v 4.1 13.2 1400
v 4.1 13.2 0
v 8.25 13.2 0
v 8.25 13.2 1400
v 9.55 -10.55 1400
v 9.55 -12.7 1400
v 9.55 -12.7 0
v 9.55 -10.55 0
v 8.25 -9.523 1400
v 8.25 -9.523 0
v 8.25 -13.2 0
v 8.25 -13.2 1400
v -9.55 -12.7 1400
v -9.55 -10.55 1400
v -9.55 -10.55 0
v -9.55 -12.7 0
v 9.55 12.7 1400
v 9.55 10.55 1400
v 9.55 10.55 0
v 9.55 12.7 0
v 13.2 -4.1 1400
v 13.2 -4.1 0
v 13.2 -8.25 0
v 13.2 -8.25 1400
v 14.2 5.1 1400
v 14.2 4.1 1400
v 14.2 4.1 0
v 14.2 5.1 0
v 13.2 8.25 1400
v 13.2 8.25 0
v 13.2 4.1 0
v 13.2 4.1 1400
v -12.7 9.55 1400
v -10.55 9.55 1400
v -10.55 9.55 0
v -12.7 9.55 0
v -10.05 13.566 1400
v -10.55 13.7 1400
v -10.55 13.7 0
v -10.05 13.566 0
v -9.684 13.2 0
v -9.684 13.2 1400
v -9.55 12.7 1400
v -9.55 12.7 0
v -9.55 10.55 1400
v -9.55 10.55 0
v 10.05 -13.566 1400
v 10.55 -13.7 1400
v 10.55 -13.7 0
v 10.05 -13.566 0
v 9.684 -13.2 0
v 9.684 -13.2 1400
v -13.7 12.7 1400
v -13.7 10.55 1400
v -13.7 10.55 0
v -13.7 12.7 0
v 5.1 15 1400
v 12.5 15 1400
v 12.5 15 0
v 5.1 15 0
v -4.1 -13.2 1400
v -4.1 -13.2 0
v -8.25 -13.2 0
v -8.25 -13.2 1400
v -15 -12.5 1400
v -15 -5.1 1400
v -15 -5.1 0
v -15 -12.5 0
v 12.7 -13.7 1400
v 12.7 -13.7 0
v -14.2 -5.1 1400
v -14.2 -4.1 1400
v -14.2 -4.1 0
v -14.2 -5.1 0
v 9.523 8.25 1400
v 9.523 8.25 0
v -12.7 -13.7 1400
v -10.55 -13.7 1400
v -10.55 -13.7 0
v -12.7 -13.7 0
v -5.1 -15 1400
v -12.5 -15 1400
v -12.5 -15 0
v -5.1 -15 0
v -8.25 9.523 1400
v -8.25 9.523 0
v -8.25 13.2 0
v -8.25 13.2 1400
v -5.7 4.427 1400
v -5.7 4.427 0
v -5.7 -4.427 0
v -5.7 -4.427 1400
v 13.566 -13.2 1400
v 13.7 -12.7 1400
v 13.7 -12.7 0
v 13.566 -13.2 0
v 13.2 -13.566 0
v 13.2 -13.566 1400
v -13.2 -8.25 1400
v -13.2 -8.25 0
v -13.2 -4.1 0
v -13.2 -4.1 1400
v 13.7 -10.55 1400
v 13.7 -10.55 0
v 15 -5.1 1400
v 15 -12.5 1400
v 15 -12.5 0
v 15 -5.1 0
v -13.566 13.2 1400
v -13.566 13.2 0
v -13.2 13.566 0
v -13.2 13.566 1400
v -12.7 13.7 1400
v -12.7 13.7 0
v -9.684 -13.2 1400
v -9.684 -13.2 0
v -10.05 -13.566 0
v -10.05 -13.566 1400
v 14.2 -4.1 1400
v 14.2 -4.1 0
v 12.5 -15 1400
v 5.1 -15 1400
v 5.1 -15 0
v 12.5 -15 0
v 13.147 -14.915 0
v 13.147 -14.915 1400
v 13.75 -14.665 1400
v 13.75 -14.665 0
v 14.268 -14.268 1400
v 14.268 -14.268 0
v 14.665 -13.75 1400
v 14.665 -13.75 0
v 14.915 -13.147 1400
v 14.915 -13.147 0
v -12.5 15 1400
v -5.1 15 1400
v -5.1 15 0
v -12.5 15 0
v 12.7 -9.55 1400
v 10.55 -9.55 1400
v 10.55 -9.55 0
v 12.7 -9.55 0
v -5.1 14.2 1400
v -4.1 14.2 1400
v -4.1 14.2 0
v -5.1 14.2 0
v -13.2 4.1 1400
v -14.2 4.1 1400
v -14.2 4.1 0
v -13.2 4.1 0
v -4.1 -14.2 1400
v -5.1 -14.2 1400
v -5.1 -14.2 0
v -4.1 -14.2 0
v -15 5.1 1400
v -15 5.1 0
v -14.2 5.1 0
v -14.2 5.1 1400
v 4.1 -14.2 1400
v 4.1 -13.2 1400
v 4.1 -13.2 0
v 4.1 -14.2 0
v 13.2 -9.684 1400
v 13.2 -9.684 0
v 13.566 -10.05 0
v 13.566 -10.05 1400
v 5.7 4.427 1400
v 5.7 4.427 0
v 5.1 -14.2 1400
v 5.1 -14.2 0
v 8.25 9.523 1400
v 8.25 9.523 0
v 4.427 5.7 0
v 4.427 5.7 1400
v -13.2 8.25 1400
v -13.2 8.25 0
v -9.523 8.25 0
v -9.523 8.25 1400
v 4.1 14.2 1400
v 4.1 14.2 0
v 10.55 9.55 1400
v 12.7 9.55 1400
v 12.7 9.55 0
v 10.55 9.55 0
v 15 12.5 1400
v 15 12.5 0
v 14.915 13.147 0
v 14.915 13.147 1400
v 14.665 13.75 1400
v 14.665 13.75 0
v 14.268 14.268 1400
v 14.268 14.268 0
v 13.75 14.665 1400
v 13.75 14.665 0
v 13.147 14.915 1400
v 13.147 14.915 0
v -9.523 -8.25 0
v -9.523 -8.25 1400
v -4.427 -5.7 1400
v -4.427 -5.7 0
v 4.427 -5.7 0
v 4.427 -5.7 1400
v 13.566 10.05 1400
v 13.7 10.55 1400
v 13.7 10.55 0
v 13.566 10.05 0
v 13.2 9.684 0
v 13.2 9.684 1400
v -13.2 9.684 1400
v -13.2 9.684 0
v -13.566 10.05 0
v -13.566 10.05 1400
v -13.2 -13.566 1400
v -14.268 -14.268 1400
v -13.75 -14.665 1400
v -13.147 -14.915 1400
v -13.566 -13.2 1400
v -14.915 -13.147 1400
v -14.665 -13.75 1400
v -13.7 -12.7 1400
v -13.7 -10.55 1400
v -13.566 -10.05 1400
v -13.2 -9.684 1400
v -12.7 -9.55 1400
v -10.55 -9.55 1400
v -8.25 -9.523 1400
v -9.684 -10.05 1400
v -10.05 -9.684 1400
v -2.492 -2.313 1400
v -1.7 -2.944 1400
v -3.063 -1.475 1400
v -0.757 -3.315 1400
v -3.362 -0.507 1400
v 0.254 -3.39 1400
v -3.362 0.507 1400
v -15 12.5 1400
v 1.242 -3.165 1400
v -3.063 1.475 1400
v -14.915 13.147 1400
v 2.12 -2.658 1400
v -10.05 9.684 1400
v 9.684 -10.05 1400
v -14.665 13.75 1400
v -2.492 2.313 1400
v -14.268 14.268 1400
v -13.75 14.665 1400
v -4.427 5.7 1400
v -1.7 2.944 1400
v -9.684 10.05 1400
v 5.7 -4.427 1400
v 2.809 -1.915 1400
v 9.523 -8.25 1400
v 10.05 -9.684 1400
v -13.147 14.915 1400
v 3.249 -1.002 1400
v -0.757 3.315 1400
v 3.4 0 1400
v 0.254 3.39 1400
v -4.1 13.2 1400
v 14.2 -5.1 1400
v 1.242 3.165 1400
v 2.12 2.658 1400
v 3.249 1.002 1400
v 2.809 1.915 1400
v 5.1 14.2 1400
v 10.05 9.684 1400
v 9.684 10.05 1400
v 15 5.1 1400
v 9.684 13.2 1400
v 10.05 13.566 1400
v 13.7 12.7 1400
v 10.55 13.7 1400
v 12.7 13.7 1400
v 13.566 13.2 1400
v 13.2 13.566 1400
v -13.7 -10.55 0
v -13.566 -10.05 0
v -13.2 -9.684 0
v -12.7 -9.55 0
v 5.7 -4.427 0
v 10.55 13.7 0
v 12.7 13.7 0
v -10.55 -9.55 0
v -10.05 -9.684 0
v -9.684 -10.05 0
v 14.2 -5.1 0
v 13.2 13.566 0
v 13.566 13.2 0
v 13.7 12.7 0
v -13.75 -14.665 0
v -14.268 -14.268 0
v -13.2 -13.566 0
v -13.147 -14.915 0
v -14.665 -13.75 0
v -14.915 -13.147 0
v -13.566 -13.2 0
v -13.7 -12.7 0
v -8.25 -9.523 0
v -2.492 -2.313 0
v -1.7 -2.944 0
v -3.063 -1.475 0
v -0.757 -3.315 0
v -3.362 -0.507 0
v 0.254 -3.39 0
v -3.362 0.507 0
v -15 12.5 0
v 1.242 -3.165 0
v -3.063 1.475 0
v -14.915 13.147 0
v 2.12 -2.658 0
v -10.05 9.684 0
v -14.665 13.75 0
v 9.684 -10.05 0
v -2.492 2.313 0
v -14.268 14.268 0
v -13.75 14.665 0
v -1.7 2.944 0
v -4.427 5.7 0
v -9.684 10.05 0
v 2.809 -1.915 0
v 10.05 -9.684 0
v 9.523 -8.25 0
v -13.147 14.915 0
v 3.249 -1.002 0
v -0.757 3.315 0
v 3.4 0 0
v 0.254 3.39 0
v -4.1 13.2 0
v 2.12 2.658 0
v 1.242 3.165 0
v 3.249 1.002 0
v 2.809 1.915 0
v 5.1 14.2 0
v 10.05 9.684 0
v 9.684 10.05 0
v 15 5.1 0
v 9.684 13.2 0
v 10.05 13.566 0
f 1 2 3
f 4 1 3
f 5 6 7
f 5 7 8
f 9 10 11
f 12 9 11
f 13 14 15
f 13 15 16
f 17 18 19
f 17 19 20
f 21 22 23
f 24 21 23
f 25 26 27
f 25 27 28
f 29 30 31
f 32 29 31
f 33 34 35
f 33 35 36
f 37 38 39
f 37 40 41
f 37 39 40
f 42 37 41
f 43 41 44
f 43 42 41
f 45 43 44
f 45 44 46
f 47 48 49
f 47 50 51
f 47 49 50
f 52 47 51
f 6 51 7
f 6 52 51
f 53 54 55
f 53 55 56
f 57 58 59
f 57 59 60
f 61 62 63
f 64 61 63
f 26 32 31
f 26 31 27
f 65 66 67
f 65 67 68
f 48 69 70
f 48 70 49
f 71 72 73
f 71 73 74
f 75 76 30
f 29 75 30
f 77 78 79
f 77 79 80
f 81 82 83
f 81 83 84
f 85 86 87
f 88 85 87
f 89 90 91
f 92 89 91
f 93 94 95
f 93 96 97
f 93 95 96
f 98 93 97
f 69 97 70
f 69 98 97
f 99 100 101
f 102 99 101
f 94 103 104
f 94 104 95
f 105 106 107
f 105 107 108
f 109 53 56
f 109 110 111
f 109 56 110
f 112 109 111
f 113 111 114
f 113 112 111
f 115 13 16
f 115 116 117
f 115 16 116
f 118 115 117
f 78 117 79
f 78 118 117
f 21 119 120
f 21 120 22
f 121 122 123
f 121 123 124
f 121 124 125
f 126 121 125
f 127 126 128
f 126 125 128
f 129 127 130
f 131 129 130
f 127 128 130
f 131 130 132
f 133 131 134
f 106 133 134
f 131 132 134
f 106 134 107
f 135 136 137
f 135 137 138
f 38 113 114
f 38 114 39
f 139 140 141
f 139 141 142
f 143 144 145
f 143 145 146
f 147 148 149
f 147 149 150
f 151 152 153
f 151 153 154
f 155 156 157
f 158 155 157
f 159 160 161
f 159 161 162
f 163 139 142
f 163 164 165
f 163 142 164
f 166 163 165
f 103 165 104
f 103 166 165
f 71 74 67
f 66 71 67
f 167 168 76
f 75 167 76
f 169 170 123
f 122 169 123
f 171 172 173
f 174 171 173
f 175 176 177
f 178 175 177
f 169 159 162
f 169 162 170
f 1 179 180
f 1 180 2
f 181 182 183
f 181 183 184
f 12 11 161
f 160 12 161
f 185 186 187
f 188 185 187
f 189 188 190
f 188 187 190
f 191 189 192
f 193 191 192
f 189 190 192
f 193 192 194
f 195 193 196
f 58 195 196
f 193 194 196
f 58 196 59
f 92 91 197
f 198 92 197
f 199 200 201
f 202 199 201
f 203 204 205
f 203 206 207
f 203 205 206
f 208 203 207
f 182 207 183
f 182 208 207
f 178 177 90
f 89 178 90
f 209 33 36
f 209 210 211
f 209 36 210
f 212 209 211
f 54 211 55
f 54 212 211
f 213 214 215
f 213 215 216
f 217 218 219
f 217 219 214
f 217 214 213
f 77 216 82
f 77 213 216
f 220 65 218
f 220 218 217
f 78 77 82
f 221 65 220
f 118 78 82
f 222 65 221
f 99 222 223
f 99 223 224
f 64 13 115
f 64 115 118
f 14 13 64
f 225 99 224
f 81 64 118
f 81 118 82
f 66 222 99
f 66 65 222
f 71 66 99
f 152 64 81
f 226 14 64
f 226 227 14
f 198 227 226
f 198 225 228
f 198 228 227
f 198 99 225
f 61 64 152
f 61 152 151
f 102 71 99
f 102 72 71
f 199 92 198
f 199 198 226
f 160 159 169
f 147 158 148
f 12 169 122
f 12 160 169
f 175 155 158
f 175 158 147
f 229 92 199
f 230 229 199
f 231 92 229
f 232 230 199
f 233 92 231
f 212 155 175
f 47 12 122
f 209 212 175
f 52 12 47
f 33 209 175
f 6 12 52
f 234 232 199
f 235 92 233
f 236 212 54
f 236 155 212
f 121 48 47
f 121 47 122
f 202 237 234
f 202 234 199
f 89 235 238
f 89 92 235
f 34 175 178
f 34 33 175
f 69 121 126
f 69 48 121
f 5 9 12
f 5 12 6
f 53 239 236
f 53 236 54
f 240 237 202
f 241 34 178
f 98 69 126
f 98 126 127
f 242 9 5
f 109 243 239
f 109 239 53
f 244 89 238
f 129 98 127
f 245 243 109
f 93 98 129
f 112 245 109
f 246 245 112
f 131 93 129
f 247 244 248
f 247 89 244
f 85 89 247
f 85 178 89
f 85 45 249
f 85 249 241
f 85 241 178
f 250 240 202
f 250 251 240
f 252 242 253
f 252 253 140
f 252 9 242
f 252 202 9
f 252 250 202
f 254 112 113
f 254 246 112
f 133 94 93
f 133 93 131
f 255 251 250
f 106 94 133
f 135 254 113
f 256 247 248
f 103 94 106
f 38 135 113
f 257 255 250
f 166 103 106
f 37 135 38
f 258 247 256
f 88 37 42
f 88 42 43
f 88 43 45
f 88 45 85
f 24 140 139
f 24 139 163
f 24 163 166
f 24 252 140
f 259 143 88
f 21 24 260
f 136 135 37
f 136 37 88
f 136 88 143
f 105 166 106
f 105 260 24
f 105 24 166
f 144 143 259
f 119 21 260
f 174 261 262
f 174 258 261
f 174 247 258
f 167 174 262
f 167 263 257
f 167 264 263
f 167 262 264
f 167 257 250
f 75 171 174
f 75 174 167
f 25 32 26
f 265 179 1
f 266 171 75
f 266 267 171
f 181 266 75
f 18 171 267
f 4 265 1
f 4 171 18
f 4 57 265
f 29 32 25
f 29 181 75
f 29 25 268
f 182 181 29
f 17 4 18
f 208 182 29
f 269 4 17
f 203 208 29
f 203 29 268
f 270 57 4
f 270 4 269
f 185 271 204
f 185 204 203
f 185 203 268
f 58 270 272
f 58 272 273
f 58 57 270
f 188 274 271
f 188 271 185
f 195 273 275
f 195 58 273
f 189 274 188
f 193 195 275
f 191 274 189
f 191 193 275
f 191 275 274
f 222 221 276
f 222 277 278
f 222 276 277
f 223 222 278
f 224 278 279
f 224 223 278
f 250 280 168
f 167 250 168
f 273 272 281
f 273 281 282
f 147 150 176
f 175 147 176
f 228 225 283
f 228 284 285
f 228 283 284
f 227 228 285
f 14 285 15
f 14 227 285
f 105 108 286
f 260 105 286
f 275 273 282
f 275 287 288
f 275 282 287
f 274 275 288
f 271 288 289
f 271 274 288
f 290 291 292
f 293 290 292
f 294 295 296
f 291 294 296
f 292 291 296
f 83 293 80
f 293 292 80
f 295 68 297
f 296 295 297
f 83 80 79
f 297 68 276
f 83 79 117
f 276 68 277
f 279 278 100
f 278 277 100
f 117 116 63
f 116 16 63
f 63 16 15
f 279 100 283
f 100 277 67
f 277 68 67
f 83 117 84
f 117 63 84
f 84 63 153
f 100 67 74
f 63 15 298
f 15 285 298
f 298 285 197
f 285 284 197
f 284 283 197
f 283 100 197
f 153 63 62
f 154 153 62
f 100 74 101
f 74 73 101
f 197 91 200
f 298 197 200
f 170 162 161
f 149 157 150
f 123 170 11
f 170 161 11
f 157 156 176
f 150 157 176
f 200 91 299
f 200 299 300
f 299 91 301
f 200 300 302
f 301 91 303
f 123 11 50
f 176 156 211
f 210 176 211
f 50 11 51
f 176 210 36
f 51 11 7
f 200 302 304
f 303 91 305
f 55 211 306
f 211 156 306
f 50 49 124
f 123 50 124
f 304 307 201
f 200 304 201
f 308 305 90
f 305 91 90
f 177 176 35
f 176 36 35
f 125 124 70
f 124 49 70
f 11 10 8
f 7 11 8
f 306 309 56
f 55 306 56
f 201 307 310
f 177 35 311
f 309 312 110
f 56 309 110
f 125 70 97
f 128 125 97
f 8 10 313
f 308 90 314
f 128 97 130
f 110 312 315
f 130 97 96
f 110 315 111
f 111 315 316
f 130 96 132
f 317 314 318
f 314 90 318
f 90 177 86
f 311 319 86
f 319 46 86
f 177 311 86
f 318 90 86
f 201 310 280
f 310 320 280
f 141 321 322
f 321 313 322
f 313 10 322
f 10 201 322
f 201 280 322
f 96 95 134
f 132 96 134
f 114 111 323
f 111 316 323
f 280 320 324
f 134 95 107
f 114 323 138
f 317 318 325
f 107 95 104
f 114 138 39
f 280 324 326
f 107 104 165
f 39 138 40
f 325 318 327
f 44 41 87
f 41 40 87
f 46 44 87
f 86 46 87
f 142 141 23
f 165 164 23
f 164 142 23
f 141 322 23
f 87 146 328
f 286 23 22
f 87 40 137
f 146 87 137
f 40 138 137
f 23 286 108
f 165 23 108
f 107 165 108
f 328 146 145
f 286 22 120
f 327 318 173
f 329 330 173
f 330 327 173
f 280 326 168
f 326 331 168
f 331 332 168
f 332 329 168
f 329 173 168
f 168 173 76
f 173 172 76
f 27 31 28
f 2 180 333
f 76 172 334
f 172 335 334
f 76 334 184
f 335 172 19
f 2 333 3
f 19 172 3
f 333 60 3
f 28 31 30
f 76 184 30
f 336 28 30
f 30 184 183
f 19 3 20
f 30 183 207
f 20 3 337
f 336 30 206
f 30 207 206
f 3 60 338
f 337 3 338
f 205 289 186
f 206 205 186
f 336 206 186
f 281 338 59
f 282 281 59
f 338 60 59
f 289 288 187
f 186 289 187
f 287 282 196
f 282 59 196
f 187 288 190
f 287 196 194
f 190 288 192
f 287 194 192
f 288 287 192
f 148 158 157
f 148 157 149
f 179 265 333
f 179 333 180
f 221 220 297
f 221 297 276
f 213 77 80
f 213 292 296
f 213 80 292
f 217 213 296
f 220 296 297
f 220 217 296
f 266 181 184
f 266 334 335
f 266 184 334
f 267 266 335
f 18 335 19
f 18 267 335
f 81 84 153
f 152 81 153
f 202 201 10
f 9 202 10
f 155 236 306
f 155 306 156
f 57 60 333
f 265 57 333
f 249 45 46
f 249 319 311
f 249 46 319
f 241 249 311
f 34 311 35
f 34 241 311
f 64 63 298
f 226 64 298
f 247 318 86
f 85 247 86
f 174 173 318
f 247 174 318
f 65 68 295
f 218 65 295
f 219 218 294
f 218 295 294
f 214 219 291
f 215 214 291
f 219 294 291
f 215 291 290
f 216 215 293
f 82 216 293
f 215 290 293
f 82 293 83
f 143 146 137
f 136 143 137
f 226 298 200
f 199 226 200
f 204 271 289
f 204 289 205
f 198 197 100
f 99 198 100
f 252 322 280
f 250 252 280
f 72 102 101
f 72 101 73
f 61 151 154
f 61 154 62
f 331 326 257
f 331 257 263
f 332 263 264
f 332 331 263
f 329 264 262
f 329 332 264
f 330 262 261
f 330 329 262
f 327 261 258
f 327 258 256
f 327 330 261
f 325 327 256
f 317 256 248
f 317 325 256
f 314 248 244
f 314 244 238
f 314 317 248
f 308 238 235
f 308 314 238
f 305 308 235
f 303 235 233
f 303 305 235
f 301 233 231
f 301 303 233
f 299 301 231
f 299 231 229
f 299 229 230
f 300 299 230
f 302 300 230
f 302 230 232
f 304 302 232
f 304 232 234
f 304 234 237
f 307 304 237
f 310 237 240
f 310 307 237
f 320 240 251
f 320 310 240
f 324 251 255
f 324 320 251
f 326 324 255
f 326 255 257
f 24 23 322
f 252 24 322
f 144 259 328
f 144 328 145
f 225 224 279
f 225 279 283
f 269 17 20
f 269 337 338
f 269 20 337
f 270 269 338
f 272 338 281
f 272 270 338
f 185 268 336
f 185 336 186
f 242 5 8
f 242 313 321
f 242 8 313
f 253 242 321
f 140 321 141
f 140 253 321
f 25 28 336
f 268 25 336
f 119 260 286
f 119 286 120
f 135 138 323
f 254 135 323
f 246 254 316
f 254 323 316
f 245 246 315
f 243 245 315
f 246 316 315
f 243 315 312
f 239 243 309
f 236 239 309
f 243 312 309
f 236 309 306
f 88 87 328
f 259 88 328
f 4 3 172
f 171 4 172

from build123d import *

# Parameters (mm, degrees)
SKETCH1_R      = 3.4
EXTRUDE1_DEPTH = 1400
EXTRUDE2_DEPTH = 1401.160705062


with BuildPart() as part:
    # Sketch1 → Extrude1 (new body)
    with BuildSketch(Plane.XY):
        with BuildLine():
            Line((-5.1, 14.2), (-5.1, 15))
            Line((-5.1, 15), (-12.5, 15))
            ThreePointArc((-12.5, 15), (-14.267766953, 14.267766953), (-15, 12.5))
            Line((-15, 12.5), (-15, 5.1))
            Line((-15, 5.1), (-14.2, 5.1))
            Line((-14.2, 5.1), (-14.2, 4.1))
            Line((-14.2, 4.1), (-13.2, 4.1))
            Line((-13.2, 4.1), (-13.2, 8.25))
            Line((-13.2, 8.25), (-9.522792206, 8.25))
            Line((-9.522792206, 8.25), (-5.7, 4.427207794))
            Line((-5.7, 4.427207794), (-5.7, -4.427207794))
            Line((-5.7, -4.427207794), (-9.522792206, -8.25))
            Line((-9.522792206, -8.25), (-13.2, -8.25))
            Line((-13.2, -8.25), (-13.2, -4.1))
            Line((-13.2, -4.1), (-14.2, -4.1))
            Line((-14.2, -4.1), (-14.2, -5.1))
            Line((-14.2, -5.1), (-15, -5.1))
            Line((-15, -5.1), (-15, -12.5))
            ThreePointArc((-15, -12.5), (-14.267766953, -14.267766953), (-12.5, -15))
            Line((-12.5, -15), (-5.1, -15))
            Line((-5.1, -15), (-5.1, -14.2))
            Line((-5.1, -14.2), (-4.1, -14.2))
            Line((-4.1, -14.2), (-4.1, -13.2))
            Line((-4.1, -13.2), (-8.25, -13.2))
            Line((-8.25, -13.2), (-8.25, -9.522792206))
            Line((-8.25, -9.522792206), (-4.427207794, -5.7))
            Line((-4.427207794, -5.7), (4.427207794, -5.7))
            Line((4.427207794, -5.7), (8.25, -9.522792206))
            Line((8.25, -9.522792206), (8.25, -13.2))
            Line((8.25, -13.2), (4.1, -13.2))
            Line((4.1, -13.2), (4.1, -14.2))
            Line((4.1, -14.2), (5.1, -14.2))
            Line((5.1, -14.2), (5.1, -15))
            Line((5.1, -15), (12.5, -15))
            ThreePointArc((12.5, -15), (14.267766953, -14.267766953), (15, -12.5))
            Line((15, -12.5), (15, -5.1))
            Line((15, -5.1), (14.2, -5.1))
            Line((14.2, -5.1), (14.2, -4.1))
            Line((14.2, -4.1), (13.2, -4.1))
            Line((13.2, -4.1), (13.2, -8.25))
            Line((13.2, -8.25), (9.522792206, -8.25))
            Line((9.522792206, -8.25), (5.7, -4.427207794))
            Line((5.7, -4.427207794), (5.7, 4.427207794))
            Line((5.7, 4.427207794), (9.522792206, 8.25))
            Line((9.522792206, 8.25), (13.2, 8.25))
            Line((13.2, 8.25), (13.2, 4.1))
            Line((13.2, 4.1), (14.2, 4.1))
            Line((14.2, 4.1), (14.2, 5.1))
            Line((14.2, 5.1), (15, 5.1))
            Line((15, 5.1), (15, 12.5))
            ThreePointArc((15, 12.5), (14.267766953, 14.267766953), (12.5, 15))
            Line((12.5, 15), (5.1, 15))
            Line((5.1, 15), (5.1, 14.2))
            Line((5.1, 14.2), (4.1, 14.2))
            Line((4.1, 14.2), (4.1, 13.2))
            Line((4.1, 13.2), (8.25, 13.2))
            Line((8.25, 13.2), (8.25, 9.522792206))
            Line((8.25, 9.522792206), (4.427207794, 5.7))
            Line((4.427207794, 5.7), (-4.427207794, 5.7))
            Line((-4.427207794, 5.7), (-8.25, 9.522792206))
            Line((-8.25, 9.522792206), (-8.25, 13.2))
            Line((-8.25, 13.2), (-4.1, 13.2))
            Line((-4.1, 13.2), (-4.1, 14.2))
            Line((-4.1, 14.2), (-5.1, 14.2))
        make_face()
        Circle(SKETCH1_R, mode=Mode.SUBTRACT)
    extrude(amount=EXTRUDE1_DEPTH)

    # Sketch2 → Extrude2 (cut, through all)
    with BuildSketch(Plane.XY.offset(1400)):
        with BuildLine():
            Line((13.7, 12.7), (13.7, 10.55))
            ThreePointArc((13.7, 10.55), (13.407106781, 9.842893219), (12.7, 9.55))
            Line((12.7, 9.55), (10.55, 9.55))
            ThreePointArc((10.55, 9.55), (9.842893219, 9.842893219), (9.55, 10.55))
            Line((9.55, 10.55), (9.55, 12.7))
            ThreePointArc((9.55, 12.7), (9.842893219, 13.407106781), (10.55, 13.7))
            Line((10.55, 13.7), (12.7, 13.7))
            ThreePointArc((12.7, 13.7), (13.407106781, 13.407106781), (13.7, 12.7))
        make_face()
        with BuildLine():
            Line((-12.7, 13.7), (-10.55, 13.7))
            ThreePointArc((-10.55, 13.7), (-9.842893219, 13.407106781), (-9.55, 12.7))
            Line((-9.55, 12.7), (-9.55, 10.55))
            ThreePointArc((-9.55, 10.55), (-9.842893219, 9.842893219), (-10.55, 9.55))
            Line((-10.55, 9.55), (-12.7, 9.55))
            ThreePointArc((-12.7, 9.55), (-13.407106781, 9.842893219), (-13.7, 10.55))
            Line((-13.7, 10.55), (-13.7, 12.7))
            ThreePointArc((-13.7, 12.7), (-13.407106781, 13.407106781), (-12.7, 13.7))
        make_face()
        with BuildLine():
            Line((12.7, -13.7), (10.55, -13.7))
            ThreePointArc((10.55, -13.7), (9.842893219, -13.407106781), (9.55, -12.7))
            Line((9.55, -12.7), (9.55, -10.55))
            ThreePointArc((9.55, -10.55), (9.842893219, -9.842893219), (10.55, -9.55))
            Line((10.55, -9.55), (12.7, -9.55))
            ThreePointArc((12.7, -9.55), (13.407106781, -9.842893219), (13.7, -10.55))
            Line((13.7, -10.55), (13.7, -12.7))
            ThreePointArc((13.7, -12.7), (13.407106781, -13.407106781), (12.7, -13.7))
        make_face()
        with BuildLine():
            Line((-13.7, -12.7), (-13.7, -10.55))
            ThreePointArc((-13.7, -10.55), (-13.407106781, -9.842893219), (-12.7, -9.55))
            Line((-12.7, -9.55), (-10.55, -9.55))
            ThreePointArc((-10.55, -9.55), (-9.842893219, -9.842893219), (-9.55, -10.55))
            Line((-9.55, -10.55), (-9.55, -12.7))
            ThreePointArc((-9.55, -12.7), (-9.842893219, -13.407106781), (-10.55, -13.7))
            Line((-10.55, -13.7), (-12.7, -13.7))
            ThreePointArc((-12.7, -13.7), (-13.407106781, -13.407106781), (-13.7, -12.7))
        make_face()
    extrude(amount=-EXTRUDE2_DEPTH, mode=Mode.SUBTRACT)


solid = part.part
